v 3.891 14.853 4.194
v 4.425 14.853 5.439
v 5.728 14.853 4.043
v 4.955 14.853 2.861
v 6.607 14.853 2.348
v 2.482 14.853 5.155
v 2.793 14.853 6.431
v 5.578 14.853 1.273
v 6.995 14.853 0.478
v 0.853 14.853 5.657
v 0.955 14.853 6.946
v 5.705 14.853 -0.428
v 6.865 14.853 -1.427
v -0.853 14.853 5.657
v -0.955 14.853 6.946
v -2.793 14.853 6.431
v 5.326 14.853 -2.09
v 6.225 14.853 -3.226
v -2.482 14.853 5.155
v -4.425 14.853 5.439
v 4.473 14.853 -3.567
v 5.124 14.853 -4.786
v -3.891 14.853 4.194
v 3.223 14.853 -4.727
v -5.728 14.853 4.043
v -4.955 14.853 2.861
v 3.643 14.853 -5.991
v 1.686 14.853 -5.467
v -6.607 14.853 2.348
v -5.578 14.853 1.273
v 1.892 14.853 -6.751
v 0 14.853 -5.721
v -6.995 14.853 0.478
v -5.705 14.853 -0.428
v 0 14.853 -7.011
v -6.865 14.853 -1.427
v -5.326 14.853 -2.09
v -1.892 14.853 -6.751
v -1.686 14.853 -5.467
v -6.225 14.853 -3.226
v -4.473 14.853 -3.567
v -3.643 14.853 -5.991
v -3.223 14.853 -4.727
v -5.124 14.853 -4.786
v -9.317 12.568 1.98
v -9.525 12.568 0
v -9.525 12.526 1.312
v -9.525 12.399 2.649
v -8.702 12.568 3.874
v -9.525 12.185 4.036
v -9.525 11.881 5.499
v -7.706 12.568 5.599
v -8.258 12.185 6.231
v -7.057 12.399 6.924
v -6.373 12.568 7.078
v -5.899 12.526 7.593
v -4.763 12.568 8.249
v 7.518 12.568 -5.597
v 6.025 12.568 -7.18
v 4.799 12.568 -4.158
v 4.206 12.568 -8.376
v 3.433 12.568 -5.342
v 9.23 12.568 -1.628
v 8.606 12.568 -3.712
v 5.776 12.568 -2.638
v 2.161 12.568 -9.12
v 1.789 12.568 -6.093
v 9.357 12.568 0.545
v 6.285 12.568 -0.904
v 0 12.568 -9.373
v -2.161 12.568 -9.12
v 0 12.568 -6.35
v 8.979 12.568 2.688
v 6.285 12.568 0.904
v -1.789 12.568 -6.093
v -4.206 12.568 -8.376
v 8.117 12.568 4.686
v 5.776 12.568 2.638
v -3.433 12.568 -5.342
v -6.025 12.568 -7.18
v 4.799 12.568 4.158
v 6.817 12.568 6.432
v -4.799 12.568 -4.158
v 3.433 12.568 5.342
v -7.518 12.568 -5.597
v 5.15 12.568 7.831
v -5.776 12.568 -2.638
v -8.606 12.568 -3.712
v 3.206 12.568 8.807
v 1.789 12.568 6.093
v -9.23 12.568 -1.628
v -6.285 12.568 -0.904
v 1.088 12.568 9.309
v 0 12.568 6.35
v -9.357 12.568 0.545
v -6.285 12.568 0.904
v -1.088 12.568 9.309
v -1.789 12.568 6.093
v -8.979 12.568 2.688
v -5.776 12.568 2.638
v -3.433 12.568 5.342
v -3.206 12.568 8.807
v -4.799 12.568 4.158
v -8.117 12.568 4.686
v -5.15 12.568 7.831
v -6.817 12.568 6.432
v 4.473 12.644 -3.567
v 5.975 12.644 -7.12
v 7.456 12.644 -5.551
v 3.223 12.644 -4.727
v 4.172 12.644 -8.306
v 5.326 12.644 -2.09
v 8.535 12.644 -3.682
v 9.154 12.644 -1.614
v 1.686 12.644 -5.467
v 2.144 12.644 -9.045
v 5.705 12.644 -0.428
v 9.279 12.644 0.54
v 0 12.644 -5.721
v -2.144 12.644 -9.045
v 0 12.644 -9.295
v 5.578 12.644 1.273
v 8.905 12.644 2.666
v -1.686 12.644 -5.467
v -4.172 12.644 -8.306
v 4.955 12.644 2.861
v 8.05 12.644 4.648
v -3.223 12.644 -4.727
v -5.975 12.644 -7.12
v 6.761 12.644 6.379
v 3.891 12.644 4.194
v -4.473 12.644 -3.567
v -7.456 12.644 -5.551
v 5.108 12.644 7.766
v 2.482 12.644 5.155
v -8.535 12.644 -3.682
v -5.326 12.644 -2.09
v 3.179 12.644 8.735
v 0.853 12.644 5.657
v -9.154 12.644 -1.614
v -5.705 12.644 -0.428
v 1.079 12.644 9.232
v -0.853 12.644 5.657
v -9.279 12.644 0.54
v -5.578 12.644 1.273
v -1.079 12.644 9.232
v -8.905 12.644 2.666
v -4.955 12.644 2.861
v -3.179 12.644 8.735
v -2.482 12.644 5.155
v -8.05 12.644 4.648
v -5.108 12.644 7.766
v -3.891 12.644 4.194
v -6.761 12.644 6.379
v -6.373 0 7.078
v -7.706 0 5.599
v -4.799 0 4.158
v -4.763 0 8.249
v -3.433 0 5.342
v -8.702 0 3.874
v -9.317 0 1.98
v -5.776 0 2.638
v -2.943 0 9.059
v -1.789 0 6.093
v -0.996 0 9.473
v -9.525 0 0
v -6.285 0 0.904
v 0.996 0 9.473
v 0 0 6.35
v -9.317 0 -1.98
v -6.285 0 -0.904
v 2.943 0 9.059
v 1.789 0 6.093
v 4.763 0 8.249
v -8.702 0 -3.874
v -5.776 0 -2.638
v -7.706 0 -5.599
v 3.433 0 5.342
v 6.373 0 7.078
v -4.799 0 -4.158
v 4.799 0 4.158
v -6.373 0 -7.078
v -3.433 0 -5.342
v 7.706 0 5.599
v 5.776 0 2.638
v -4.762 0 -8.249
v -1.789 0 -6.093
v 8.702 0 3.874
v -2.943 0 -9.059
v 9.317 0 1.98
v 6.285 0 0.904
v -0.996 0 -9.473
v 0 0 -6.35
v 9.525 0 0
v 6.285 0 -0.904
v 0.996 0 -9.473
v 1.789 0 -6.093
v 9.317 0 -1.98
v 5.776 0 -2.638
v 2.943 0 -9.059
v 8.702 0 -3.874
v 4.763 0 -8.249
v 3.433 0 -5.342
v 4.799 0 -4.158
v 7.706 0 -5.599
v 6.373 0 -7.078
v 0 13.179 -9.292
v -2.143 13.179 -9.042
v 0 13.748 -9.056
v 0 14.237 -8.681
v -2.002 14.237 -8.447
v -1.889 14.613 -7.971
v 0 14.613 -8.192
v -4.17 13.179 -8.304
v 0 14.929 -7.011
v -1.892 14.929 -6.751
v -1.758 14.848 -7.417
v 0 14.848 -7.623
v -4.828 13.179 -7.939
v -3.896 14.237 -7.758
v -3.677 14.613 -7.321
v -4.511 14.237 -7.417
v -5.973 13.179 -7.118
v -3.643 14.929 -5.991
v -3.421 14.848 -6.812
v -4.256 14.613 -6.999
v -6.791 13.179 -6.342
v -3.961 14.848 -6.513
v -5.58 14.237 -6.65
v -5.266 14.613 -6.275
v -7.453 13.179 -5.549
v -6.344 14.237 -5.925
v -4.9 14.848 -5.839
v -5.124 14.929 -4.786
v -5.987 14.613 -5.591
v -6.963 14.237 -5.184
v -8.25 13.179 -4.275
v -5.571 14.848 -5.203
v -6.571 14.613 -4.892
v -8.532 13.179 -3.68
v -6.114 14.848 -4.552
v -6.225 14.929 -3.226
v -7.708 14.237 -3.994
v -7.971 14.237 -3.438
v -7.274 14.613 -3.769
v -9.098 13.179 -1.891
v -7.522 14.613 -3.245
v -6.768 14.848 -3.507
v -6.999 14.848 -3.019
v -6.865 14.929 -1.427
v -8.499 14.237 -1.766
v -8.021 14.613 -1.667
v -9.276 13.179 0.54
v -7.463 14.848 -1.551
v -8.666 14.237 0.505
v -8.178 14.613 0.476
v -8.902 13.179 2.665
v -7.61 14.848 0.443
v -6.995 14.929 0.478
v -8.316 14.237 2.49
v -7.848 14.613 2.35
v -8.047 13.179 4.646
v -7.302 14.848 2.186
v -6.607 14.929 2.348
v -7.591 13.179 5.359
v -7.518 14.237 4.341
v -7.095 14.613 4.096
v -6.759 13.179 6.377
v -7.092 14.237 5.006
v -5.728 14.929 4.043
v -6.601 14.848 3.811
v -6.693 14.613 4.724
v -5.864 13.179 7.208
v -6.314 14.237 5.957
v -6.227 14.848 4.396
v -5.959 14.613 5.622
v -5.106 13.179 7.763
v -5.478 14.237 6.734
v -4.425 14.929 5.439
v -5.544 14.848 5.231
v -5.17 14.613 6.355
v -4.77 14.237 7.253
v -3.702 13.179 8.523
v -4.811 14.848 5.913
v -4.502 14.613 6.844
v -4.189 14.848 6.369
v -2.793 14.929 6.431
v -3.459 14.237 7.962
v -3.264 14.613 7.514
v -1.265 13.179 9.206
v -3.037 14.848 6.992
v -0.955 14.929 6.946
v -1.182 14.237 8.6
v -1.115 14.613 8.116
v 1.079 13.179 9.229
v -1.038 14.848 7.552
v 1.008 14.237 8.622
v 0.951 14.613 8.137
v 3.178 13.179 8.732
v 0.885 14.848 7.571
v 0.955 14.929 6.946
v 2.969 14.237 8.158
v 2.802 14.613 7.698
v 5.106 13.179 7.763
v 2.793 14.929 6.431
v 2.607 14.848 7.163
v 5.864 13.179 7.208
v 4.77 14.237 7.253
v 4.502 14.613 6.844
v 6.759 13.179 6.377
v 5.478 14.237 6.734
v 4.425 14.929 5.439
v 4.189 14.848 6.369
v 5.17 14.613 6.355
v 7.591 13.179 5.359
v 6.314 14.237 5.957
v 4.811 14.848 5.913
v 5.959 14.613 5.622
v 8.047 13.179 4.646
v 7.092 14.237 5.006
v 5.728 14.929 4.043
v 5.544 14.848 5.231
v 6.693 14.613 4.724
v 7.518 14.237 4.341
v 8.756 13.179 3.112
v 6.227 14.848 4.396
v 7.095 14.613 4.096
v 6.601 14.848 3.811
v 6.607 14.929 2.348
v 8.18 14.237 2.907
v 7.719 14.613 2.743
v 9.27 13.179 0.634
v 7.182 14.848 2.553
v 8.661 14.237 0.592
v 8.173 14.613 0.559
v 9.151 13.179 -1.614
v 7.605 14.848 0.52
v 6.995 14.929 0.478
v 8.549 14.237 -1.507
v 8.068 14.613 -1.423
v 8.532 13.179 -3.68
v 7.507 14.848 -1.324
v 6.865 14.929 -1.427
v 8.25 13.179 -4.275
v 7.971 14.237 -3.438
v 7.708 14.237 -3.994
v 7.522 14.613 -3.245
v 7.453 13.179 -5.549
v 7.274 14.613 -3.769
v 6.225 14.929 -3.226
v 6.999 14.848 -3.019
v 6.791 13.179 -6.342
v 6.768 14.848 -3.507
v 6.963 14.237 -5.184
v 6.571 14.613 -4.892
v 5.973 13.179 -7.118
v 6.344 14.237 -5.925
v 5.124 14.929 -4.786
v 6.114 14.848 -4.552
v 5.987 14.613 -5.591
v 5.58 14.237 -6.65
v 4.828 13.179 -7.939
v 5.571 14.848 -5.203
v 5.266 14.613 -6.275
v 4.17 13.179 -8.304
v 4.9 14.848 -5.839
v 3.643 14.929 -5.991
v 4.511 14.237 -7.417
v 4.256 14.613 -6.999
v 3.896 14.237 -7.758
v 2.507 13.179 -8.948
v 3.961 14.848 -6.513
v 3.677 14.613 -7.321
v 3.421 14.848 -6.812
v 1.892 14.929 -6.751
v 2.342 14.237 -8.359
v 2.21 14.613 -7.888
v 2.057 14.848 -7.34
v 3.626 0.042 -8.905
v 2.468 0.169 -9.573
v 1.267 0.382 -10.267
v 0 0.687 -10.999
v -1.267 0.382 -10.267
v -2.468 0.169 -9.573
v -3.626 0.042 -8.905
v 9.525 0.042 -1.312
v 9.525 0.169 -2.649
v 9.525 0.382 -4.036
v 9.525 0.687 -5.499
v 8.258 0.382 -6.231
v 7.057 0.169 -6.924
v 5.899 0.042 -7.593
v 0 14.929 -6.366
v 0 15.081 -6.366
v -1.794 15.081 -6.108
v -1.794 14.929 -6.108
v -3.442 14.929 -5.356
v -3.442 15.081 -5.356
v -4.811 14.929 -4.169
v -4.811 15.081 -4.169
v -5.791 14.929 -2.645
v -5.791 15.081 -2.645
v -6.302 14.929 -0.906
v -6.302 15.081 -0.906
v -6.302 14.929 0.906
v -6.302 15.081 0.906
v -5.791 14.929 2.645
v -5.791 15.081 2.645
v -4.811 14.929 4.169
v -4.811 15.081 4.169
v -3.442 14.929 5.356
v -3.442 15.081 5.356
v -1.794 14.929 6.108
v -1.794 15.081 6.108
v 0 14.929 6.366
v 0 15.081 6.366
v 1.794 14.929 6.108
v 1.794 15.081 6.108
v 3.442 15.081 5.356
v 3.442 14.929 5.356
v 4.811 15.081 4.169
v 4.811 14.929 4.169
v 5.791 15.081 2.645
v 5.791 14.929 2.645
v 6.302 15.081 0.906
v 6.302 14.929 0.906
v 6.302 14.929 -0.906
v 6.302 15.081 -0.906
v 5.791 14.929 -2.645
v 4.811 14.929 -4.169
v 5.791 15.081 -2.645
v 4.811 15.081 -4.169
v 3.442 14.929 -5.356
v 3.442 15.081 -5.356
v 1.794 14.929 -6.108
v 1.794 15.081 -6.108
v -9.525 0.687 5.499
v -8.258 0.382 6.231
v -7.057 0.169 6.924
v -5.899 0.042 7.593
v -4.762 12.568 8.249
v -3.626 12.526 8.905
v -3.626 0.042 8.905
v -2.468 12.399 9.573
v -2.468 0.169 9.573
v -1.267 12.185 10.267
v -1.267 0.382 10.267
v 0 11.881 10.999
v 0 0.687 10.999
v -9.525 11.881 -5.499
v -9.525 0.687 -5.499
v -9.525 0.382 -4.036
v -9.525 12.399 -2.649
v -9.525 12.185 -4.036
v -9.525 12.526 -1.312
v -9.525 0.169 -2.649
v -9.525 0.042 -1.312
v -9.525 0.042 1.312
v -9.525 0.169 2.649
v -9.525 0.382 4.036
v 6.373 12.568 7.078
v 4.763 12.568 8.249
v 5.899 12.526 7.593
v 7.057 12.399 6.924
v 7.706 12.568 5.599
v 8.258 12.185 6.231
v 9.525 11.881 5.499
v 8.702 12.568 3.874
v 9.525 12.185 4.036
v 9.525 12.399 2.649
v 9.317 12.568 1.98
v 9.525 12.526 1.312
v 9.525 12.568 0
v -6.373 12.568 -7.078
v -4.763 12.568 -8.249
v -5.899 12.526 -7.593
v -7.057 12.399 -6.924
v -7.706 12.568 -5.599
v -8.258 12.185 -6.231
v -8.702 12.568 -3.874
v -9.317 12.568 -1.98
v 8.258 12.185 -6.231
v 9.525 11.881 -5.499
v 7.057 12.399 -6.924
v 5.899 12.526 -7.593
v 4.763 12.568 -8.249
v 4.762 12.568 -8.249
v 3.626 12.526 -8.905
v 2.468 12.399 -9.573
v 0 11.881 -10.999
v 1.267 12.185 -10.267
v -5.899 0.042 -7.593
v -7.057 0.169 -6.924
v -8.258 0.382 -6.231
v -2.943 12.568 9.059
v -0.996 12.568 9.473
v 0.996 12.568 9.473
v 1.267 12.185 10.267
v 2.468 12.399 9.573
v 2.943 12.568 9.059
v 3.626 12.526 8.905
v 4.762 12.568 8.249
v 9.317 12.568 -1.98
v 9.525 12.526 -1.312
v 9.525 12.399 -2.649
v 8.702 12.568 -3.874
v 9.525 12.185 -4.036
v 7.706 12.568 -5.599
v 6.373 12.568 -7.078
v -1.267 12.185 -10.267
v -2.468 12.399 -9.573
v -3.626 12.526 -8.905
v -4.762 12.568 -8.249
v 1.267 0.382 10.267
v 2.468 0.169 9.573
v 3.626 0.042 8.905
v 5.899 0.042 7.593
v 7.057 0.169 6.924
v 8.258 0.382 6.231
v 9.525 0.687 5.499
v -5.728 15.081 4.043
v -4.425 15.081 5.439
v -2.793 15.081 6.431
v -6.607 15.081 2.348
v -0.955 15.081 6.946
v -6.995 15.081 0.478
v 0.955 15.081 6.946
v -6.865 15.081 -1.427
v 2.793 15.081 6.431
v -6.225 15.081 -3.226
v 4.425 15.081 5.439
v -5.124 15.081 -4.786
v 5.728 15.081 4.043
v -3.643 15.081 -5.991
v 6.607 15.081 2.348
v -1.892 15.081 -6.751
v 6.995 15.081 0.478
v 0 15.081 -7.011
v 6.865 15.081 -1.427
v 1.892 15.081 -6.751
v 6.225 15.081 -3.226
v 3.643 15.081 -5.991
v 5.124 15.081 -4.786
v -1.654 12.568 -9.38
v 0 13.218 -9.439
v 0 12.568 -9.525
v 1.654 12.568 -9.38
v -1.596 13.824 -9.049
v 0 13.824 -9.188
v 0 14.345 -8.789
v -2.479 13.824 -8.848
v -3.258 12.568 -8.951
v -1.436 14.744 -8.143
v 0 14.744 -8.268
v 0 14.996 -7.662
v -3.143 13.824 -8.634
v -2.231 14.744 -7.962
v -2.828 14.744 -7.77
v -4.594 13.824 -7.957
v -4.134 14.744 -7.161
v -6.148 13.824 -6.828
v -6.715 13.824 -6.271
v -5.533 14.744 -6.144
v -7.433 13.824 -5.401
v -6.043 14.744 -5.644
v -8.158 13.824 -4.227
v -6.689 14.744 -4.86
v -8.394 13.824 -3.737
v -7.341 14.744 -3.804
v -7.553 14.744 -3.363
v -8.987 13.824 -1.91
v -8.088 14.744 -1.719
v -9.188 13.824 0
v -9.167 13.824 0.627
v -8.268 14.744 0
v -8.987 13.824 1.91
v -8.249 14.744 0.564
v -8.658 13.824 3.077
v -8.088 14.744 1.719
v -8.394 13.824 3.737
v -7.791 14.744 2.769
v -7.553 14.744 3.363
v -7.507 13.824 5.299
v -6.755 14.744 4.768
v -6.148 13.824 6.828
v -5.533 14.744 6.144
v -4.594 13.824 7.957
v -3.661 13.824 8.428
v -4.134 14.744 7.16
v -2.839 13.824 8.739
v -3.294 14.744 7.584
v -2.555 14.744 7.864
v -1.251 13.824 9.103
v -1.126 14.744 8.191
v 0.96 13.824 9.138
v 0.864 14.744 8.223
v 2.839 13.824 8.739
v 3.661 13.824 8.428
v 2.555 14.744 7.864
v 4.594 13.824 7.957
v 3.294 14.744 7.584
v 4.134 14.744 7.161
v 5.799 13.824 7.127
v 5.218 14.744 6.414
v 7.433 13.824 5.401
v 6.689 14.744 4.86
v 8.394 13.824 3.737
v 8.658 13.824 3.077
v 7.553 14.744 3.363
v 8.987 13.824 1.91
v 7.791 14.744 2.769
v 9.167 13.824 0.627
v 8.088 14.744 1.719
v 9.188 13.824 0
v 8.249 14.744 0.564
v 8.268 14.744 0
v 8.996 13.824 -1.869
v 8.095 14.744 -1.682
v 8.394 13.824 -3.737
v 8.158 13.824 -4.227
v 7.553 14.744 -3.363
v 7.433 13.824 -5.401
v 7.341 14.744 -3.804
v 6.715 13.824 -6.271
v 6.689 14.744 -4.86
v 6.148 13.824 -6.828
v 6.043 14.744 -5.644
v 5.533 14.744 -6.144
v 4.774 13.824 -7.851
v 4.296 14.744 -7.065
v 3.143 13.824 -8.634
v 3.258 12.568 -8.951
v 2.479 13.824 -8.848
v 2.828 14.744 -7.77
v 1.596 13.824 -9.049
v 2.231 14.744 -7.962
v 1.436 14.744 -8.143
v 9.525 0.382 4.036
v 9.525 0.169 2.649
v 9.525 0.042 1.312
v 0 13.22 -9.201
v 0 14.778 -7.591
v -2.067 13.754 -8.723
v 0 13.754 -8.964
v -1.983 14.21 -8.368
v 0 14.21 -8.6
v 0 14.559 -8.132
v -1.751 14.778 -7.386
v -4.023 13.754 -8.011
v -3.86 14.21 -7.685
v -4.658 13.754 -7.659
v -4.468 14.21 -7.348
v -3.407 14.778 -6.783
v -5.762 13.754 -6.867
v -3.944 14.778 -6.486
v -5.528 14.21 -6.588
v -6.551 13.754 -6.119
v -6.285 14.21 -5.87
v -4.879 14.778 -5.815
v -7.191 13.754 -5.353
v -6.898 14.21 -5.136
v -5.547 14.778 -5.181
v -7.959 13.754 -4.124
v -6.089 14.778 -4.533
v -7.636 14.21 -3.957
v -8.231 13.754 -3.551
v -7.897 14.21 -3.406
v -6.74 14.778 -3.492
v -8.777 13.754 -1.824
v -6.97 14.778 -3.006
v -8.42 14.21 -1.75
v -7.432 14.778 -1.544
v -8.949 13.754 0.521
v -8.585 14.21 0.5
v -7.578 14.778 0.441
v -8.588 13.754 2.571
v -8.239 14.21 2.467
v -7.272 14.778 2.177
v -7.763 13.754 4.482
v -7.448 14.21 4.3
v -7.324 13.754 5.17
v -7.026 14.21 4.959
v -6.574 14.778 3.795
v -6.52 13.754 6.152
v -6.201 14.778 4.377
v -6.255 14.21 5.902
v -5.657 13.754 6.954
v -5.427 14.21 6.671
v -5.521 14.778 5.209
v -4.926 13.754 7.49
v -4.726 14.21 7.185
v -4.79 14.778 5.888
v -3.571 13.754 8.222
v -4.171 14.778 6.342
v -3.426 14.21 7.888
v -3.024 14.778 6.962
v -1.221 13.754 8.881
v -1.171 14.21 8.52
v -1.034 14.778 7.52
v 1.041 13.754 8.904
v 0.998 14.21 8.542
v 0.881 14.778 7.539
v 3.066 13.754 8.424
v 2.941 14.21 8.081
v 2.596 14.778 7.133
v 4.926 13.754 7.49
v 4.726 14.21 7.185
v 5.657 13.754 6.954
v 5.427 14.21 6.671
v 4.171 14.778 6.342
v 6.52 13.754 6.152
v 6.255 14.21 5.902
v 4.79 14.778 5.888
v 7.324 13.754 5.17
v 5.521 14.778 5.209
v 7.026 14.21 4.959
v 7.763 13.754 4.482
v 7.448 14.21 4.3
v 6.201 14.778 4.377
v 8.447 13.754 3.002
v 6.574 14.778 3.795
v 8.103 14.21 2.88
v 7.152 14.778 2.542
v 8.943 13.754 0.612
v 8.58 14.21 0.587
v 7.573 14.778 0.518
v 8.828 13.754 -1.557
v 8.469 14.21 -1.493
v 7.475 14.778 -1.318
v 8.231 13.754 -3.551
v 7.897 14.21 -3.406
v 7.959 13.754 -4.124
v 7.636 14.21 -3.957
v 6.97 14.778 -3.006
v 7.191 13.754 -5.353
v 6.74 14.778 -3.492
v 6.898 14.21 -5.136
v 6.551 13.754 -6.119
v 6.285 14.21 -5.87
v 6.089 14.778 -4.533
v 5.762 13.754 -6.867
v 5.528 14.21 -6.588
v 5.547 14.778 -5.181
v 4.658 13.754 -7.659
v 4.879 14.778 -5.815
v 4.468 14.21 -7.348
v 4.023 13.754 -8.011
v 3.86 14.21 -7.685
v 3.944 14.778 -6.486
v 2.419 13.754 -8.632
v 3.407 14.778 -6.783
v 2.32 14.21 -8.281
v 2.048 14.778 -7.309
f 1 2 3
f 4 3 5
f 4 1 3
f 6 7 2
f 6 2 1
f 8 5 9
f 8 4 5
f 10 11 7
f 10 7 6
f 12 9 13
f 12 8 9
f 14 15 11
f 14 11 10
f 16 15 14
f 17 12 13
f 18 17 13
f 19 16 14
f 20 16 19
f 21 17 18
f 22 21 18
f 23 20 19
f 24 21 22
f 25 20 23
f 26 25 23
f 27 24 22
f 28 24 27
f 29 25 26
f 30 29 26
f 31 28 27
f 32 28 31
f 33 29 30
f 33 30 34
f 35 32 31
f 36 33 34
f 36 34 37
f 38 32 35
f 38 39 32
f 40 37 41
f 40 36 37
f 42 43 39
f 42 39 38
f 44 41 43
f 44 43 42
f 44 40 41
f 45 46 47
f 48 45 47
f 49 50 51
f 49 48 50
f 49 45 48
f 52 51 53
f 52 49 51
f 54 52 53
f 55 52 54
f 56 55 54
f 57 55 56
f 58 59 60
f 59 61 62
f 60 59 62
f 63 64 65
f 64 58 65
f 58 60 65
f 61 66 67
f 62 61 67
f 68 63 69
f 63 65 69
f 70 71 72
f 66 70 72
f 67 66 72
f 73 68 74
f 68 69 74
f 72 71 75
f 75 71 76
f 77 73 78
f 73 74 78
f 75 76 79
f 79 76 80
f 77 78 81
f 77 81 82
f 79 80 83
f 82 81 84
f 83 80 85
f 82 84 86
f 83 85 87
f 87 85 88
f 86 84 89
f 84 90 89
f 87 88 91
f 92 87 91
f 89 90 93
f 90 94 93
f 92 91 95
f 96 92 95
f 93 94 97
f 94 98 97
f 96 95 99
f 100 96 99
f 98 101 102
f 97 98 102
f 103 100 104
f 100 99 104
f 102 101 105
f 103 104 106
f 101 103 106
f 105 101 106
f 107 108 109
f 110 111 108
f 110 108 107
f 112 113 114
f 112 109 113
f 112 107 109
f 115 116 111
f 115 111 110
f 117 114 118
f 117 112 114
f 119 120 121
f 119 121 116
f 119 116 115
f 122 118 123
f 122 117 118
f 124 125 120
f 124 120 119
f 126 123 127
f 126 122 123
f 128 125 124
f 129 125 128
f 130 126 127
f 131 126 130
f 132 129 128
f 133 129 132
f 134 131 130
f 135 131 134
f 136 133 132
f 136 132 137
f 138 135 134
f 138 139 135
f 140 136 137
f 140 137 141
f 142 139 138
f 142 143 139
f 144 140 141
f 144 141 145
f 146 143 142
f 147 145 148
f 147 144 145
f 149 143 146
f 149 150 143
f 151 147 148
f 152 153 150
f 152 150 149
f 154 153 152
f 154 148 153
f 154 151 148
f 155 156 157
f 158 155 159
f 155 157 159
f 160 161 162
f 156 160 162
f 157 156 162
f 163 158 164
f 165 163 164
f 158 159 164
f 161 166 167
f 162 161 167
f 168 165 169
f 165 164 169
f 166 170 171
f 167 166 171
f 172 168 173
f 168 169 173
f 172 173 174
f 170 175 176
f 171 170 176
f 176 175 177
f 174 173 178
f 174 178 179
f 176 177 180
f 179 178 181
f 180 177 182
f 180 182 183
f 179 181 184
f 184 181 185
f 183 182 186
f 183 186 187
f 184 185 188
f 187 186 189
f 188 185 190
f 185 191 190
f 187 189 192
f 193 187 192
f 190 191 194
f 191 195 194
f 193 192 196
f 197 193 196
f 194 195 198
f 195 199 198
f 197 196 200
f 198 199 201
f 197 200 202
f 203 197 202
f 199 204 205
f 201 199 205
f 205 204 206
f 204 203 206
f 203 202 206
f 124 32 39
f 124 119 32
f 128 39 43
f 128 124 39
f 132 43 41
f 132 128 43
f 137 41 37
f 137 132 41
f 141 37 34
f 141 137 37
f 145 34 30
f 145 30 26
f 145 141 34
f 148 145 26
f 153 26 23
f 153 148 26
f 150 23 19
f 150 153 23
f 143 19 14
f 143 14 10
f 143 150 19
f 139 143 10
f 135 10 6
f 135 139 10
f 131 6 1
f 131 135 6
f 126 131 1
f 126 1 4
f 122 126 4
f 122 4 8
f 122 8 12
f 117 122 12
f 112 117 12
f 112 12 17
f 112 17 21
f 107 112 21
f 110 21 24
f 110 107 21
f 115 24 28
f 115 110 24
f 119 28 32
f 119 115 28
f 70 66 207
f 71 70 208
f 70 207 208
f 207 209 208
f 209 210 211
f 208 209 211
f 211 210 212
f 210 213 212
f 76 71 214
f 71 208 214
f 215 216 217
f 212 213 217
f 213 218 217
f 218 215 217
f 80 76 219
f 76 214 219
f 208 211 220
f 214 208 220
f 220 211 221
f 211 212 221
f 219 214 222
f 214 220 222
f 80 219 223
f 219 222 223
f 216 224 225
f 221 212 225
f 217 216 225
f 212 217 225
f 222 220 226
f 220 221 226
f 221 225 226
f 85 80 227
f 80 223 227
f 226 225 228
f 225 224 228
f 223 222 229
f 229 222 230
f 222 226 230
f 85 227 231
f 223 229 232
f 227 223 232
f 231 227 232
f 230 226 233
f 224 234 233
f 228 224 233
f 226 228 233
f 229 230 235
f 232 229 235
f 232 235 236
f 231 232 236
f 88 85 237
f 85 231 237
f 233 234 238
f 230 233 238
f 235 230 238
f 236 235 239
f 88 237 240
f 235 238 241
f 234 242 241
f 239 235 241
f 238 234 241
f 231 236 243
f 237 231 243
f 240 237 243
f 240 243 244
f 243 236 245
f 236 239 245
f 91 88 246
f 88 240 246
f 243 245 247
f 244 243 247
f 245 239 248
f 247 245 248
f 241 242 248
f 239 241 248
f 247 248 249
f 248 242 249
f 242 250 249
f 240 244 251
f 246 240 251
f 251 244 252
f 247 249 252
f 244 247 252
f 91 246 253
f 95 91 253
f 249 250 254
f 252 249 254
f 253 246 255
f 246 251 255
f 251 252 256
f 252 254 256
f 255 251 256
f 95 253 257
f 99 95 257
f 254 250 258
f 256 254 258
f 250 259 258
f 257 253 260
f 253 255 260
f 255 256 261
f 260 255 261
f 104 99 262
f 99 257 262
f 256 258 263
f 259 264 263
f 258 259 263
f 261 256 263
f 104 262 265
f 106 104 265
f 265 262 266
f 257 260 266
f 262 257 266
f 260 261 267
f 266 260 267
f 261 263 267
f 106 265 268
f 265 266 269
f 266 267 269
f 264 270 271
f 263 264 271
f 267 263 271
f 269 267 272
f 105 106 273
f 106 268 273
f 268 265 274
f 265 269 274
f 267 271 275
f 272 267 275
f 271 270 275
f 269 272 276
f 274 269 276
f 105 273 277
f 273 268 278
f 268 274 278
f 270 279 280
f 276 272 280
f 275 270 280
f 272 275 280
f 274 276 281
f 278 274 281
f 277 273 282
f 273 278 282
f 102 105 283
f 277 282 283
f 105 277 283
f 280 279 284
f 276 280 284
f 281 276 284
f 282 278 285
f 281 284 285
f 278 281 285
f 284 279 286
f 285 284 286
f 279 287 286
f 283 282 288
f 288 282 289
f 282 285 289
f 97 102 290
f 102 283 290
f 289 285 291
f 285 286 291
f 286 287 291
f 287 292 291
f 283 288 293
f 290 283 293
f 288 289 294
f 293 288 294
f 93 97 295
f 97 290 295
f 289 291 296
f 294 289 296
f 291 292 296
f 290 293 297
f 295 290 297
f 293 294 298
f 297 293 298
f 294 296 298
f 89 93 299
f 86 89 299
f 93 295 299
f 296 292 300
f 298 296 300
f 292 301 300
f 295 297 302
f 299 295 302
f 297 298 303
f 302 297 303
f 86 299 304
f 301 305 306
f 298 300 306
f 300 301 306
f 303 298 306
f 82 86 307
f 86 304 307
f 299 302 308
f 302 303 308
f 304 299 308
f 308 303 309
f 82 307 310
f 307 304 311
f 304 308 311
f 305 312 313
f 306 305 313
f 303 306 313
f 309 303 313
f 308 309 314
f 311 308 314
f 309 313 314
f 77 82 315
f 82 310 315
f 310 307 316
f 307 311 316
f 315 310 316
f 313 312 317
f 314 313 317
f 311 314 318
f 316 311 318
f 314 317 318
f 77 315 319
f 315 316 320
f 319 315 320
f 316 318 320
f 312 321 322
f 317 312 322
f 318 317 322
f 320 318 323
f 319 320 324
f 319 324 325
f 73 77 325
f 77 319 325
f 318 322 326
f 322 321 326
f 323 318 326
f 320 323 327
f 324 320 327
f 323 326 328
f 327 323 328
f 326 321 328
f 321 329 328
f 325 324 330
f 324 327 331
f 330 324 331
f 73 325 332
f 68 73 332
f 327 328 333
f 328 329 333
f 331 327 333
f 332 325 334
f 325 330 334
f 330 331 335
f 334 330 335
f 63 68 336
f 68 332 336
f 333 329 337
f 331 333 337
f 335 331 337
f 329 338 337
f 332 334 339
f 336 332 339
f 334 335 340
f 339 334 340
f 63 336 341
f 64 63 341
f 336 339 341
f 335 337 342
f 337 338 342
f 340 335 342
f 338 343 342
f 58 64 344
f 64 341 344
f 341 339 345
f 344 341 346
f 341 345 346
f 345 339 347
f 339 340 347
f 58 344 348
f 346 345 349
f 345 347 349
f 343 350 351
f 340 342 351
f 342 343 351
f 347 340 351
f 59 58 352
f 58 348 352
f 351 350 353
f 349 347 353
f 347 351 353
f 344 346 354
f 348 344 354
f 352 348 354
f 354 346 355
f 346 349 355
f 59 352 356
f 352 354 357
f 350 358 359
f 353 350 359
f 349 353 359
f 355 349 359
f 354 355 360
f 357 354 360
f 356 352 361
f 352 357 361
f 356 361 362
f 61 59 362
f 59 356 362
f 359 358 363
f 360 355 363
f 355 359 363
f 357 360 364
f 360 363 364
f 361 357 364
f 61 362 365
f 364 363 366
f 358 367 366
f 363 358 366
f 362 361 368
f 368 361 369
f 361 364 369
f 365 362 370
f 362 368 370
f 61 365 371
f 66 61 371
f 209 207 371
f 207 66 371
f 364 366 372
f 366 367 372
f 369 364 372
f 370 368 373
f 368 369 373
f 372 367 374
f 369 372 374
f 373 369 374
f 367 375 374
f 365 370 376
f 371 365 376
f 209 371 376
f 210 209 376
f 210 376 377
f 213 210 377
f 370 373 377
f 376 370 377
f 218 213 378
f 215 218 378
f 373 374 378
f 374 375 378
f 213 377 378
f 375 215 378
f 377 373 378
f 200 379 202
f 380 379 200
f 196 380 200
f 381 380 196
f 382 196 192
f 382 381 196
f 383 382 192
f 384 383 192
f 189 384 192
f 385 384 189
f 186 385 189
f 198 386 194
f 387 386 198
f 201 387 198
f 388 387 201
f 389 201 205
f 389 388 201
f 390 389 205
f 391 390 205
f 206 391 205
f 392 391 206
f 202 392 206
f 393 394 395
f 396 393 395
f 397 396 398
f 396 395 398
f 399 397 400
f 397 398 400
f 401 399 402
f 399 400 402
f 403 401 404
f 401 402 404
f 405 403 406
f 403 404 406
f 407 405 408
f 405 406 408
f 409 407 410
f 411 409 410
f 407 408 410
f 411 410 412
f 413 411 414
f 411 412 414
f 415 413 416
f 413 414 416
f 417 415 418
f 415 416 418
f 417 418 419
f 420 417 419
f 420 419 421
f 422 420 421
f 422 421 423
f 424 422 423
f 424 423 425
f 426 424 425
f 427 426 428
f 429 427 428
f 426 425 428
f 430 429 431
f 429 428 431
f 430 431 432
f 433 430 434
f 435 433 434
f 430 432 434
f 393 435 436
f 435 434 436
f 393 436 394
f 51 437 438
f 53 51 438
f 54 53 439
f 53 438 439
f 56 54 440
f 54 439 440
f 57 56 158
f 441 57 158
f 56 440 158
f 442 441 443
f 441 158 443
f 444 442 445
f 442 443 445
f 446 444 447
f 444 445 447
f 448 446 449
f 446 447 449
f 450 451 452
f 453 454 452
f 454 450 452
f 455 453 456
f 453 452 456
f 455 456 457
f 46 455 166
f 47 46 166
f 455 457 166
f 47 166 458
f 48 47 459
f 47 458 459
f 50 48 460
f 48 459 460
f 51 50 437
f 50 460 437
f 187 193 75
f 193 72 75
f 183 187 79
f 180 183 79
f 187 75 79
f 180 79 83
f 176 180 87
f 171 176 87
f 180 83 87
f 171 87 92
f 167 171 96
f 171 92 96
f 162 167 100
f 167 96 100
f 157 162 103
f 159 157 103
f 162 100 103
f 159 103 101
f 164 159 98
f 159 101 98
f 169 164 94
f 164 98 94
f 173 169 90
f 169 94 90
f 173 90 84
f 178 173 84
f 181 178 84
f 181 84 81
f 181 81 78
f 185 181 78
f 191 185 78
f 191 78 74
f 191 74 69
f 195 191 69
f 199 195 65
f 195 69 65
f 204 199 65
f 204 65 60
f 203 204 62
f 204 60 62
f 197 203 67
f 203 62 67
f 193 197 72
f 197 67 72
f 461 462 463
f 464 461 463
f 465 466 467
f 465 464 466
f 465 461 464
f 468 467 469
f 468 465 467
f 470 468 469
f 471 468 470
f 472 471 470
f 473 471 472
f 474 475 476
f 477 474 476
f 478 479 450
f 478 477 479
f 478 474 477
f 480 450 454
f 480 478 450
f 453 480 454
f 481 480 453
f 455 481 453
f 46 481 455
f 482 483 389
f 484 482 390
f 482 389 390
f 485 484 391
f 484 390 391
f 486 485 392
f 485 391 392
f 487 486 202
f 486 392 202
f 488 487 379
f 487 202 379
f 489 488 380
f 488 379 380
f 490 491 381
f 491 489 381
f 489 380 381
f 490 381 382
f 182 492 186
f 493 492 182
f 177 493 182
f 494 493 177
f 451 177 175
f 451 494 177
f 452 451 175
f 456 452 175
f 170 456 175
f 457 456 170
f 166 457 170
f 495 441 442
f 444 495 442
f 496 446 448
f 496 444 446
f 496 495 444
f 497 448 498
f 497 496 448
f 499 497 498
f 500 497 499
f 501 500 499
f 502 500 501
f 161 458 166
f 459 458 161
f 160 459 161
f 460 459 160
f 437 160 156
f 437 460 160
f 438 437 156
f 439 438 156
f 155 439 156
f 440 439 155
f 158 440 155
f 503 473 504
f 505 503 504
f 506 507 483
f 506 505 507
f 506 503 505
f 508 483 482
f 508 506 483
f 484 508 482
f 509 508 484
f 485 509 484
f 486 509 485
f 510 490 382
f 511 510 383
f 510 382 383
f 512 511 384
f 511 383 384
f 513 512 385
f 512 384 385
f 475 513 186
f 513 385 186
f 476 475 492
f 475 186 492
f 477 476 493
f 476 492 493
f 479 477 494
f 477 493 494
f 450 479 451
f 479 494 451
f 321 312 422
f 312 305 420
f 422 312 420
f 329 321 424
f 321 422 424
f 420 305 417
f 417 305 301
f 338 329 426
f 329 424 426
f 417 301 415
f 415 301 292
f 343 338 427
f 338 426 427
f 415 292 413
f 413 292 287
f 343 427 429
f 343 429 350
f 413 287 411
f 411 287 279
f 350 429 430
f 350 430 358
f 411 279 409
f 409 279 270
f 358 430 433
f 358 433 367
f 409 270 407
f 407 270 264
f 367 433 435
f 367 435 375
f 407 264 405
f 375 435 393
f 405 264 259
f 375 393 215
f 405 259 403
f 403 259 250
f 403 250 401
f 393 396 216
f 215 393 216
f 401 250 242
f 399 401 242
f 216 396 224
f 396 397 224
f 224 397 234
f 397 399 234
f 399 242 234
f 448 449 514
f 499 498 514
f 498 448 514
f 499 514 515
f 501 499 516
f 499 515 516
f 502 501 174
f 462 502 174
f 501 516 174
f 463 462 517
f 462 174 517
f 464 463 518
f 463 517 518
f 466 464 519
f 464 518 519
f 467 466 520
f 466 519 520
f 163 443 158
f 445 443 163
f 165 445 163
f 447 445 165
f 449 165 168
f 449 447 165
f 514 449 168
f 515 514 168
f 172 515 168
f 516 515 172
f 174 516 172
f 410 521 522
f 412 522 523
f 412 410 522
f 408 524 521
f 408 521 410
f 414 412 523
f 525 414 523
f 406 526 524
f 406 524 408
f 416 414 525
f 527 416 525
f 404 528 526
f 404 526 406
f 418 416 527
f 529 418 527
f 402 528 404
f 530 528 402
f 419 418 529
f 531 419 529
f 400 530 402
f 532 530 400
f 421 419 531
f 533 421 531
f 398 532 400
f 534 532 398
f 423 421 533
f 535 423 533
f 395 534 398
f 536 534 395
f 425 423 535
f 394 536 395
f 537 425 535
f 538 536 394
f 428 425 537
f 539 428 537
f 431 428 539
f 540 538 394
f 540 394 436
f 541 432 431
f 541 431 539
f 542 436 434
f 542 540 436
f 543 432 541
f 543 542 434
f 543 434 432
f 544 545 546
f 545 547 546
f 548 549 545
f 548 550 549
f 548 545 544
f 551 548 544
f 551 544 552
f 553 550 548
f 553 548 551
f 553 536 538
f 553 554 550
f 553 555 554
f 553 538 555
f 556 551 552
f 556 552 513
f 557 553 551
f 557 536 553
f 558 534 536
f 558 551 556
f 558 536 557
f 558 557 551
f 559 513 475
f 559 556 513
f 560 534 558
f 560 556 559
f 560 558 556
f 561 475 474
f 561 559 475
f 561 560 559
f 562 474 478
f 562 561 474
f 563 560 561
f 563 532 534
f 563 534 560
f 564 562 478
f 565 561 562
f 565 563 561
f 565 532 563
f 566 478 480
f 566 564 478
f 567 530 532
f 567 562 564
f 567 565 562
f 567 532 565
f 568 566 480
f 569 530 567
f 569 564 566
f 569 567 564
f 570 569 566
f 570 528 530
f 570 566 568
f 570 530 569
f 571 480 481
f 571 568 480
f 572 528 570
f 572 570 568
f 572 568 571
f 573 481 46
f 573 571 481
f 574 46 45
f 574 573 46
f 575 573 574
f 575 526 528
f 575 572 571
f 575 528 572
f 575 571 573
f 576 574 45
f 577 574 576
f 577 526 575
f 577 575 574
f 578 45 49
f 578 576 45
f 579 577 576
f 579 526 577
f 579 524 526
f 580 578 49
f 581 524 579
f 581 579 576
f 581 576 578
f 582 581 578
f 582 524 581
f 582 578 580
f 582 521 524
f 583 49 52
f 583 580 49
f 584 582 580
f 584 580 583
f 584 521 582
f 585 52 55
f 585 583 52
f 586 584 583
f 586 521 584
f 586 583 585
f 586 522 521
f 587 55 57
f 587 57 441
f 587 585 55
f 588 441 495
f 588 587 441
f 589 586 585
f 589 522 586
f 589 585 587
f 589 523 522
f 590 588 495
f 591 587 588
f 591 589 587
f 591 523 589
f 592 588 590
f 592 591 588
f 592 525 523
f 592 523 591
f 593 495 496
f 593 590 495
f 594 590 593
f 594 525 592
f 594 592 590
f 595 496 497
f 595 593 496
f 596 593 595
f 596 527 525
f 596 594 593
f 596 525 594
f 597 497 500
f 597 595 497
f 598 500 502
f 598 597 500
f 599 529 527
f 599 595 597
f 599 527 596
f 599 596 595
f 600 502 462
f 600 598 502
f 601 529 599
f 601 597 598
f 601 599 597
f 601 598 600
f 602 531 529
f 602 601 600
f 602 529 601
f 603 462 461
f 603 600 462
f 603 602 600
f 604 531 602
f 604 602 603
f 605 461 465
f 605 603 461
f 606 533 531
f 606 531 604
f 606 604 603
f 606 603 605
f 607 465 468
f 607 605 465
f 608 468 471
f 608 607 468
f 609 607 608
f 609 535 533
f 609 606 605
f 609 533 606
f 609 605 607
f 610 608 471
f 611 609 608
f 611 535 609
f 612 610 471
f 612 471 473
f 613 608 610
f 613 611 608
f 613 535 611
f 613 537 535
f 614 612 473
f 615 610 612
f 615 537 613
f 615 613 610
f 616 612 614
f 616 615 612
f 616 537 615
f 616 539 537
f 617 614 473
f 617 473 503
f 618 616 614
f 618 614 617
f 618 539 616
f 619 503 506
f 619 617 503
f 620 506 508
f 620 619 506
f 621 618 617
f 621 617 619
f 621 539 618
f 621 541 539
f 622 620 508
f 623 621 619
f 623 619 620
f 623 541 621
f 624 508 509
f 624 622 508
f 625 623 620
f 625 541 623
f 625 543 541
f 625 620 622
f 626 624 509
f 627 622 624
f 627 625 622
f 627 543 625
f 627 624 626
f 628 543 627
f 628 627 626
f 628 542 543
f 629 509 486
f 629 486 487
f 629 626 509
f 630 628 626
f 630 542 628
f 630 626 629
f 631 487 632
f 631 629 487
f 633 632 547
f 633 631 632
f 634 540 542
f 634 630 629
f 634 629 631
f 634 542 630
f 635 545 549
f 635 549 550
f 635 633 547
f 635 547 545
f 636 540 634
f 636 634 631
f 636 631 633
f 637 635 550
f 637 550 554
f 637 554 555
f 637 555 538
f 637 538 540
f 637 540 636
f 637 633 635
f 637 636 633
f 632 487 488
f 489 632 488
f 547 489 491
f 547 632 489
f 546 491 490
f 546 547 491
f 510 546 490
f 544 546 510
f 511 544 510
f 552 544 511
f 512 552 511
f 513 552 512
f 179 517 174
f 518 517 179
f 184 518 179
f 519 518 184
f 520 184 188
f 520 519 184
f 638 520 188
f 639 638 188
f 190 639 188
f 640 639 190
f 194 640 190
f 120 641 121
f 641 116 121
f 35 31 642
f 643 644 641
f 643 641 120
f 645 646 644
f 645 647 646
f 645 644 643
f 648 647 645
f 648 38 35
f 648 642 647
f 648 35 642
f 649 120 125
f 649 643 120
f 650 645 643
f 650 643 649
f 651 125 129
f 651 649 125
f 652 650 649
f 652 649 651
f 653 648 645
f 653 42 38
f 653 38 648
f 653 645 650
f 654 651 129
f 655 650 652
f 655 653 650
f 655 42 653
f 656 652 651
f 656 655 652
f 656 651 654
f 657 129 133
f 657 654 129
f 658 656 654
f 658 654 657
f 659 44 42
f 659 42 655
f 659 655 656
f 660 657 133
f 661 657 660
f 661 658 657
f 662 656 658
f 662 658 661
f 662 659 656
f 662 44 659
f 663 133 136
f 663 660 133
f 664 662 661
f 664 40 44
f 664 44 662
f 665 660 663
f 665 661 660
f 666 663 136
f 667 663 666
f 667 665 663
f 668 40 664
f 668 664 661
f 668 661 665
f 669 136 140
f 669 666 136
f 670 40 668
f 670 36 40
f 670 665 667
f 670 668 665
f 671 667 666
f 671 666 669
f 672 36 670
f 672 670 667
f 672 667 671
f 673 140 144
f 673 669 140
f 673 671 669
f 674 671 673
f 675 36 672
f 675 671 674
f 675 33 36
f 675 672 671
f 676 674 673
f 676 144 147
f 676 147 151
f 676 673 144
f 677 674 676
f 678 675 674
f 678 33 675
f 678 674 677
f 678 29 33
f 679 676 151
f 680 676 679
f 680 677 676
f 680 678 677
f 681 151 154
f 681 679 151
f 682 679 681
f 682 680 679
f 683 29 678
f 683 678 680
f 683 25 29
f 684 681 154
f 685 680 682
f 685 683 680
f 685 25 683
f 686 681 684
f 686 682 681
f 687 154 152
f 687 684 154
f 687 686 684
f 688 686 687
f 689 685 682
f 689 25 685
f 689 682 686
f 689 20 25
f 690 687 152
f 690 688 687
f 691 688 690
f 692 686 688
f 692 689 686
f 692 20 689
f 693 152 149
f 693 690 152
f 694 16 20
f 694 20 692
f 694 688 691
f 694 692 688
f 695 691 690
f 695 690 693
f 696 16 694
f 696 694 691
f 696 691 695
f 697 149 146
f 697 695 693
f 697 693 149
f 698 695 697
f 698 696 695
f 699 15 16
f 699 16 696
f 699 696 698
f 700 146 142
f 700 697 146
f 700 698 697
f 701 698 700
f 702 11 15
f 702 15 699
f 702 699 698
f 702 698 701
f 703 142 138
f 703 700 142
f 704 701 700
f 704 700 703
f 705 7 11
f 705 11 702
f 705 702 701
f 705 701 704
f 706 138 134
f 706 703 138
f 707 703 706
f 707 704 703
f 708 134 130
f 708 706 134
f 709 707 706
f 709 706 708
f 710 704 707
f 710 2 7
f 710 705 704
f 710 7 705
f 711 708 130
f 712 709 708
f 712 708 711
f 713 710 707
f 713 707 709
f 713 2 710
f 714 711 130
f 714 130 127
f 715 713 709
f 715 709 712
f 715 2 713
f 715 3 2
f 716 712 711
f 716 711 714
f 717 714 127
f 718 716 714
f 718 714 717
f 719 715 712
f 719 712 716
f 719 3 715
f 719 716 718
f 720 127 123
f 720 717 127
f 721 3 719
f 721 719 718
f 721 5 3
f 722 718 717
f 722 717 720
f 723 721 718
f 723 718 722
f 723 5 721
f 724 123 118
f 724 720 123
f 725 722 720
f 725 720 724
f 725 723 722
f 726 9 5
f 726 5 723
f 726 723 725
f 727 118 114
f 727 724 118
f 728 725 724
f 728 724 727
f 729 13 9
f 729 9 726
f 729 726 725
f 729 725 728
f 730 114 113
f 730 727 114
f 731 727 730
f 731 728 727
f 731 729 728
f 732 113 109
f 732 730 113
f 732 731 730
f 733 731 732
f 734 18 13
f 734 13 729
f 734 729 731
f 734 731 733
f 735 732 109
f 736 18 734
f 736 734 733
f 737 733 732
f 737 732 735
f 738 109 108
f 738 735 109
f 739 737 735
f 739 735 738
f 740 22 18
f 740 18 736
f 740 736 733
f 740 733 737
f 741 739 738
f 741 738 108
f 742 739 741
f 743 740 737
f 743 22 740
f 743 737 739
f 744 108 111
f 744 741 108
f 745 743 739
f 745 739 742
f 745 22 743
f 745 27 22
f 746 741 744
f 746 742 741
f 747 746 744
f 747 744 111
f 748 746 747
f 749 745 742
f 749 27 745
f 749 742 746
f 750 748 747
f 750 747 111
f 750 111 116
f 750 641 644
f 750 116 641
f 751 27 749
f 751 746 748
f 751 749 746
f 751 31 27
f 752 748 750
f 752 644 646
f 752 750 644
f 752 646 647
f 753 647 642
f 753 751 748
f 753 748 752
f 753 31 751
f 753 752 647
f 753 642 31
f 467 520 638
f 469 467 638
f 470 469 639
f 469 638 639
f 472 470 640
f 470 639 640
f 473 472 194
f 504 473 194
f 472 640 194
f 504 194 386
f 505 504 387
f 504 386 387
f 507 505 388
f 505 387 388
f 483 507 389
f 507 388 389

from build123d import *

# Parameters (mm, degrees)
EXTRUDE1_DEPTH = 15.08125
SKETCH2_W      = 6.35
SKETCH2_H      = 15.08125


with BuildPart() as part:
    # Sketch1 → Extrude1 (new body)
    with BuildSketch(Plane(origin=(0, 0, 0), x_dir=(1, 0, 0), z_dir=(0, 1, 0))):
        Polygon((0, 10.998522628), (-9.525, 5.499261314), (-9.525, -5.499261314), (0, -10.998522628), (9.525, -5.499261314), (9.525, 5.499261314), align=None)
    extrude(amount=EXTRUDE1_DEPTH)

    # Sketch4 → Cut-Revolve2 (revolve, cut)
    with BuildSketch(Plane(origin=(0, 0, 0), x_dir=(0, 0, -1), z_dir=(1, 0, 0))):
        Polygon((0, 15.08125), (6.35, 15.08125), (5.721290563, 14.788077975), (5.721290563, 0.293172025), (6.35, 0), (0, 0), align=None)
    revolve(axis=Axis((0, 15.08125, 0), (0, 1, 0)), mode=Mode.SUBTRACT)


with BuildPart() as body_2:
    # Sketch2 → Revolve1 (revolve)
    with BuildSketch(Plane(origin=(0, 0, 0), x_dir=(0, 0, -1), z_dir=(1, 0, 0))):
        with Locations((3.175, 7.540625)):
            Rectangle(SKETCH2_W, SKETCH2_H)
    revolve(axis=Axis((0, -6.35, 0), (0, 1, 0)))


with BuildPart() as part_1:
    add(part.part)

    # Combine1: cut body 2
    add(body_2.part, mode=Mode.SUBTRACT)

    # Sketch5 → Cut-Revolve3 (revolve, cut)
    with BuildSketch(Plane(origin=(0, 0, 0), x_dir=(0, 0, -1), z_dir=(1, 0, 0))):
        with BuildLine():
            Line((0, 0), (9.525, 0))
            Line((9.525, 0), (10.998522628, 0.687114886))
            Line((10.998522628, 0.687114886), (10.998522628, 11.880593447))
            Line((10.998522628, 11.880593447), (9.525, 12.567708333))
            ThreePointArc((9.525, 12.567708333), (8.788800691, 14.345050691), (7.011458333, 15.08125))
            Line((7.011458333, 15.08125), (7.011458333, 16.35125))
            Line((7.011458333, 16.35125), (12.268522628, 16.35125))
            Line((12.268522628, 16.35125), (12.268522628, -1.27))
            Line((12.268522628, -1.27), (0, -1.27))
            Line((0, -1.27), (0, 0))
        make_face()
    revolve(axis=Axis((0, 0, 0), (0, 1, 0)), mode=Mode.SUBTRACT)

    # Sketch6 → Cut-Revolve4 (revolve, cut)
    with BuildSketch(Plane(origin=(0, 0, 0), x_dir=(0, 0, -1), z_dir=(1, 0, 0))):
        with BuildLine():
            Line((0, 12.567708333), (9.3726, 12.567708333))
            ThreePointArc((9.3726, 12.567708333), (8.681037617, 14.237287617), (7.011458333, 14.92885))
            Line((7.011458333, 14.92885), (6.366374448, 14.92885))
            Line((6.366374448, 14.92885), (6.366374448, 16.35125))
            Line((6.366374448, 16.35125), (0, 16.35125))
            Line((0, 16.35125), (0, 12.567708333))
        make_face()
    revolve(axis=Axis((0, 16.35125, 0), (0, 1, 0)), mode=Mode.SUBTRACT)


with BuildPart() as body_2_2:
    # Sketch7 → Revolve2 (revolve)
    with BuildSketch(Plane(origin=(0, 0, 0), x_dir=(0, 0, -1), z_dir=(1, 0, 0))):
        with BuildLine():
            Line((5.721290563, 12.643908333), (9.295129058, 12.643908333))
            ThreePointArc((9.295129058, 12.643908333), (8.599986877, 14.210125907), (7.011458333, 14.85265))
            Line((7.011458333, 14.85265), (5.721290563, 14.85265))
            Line((5.721290563, 14.85265), (5.721290563, 12.643908333))
        make_face()
    revolve(axis=Axis((0, 12.643908333, 0), (0, 1, 0)))


solid = Compound([part_1.part, body_2_2.part])
